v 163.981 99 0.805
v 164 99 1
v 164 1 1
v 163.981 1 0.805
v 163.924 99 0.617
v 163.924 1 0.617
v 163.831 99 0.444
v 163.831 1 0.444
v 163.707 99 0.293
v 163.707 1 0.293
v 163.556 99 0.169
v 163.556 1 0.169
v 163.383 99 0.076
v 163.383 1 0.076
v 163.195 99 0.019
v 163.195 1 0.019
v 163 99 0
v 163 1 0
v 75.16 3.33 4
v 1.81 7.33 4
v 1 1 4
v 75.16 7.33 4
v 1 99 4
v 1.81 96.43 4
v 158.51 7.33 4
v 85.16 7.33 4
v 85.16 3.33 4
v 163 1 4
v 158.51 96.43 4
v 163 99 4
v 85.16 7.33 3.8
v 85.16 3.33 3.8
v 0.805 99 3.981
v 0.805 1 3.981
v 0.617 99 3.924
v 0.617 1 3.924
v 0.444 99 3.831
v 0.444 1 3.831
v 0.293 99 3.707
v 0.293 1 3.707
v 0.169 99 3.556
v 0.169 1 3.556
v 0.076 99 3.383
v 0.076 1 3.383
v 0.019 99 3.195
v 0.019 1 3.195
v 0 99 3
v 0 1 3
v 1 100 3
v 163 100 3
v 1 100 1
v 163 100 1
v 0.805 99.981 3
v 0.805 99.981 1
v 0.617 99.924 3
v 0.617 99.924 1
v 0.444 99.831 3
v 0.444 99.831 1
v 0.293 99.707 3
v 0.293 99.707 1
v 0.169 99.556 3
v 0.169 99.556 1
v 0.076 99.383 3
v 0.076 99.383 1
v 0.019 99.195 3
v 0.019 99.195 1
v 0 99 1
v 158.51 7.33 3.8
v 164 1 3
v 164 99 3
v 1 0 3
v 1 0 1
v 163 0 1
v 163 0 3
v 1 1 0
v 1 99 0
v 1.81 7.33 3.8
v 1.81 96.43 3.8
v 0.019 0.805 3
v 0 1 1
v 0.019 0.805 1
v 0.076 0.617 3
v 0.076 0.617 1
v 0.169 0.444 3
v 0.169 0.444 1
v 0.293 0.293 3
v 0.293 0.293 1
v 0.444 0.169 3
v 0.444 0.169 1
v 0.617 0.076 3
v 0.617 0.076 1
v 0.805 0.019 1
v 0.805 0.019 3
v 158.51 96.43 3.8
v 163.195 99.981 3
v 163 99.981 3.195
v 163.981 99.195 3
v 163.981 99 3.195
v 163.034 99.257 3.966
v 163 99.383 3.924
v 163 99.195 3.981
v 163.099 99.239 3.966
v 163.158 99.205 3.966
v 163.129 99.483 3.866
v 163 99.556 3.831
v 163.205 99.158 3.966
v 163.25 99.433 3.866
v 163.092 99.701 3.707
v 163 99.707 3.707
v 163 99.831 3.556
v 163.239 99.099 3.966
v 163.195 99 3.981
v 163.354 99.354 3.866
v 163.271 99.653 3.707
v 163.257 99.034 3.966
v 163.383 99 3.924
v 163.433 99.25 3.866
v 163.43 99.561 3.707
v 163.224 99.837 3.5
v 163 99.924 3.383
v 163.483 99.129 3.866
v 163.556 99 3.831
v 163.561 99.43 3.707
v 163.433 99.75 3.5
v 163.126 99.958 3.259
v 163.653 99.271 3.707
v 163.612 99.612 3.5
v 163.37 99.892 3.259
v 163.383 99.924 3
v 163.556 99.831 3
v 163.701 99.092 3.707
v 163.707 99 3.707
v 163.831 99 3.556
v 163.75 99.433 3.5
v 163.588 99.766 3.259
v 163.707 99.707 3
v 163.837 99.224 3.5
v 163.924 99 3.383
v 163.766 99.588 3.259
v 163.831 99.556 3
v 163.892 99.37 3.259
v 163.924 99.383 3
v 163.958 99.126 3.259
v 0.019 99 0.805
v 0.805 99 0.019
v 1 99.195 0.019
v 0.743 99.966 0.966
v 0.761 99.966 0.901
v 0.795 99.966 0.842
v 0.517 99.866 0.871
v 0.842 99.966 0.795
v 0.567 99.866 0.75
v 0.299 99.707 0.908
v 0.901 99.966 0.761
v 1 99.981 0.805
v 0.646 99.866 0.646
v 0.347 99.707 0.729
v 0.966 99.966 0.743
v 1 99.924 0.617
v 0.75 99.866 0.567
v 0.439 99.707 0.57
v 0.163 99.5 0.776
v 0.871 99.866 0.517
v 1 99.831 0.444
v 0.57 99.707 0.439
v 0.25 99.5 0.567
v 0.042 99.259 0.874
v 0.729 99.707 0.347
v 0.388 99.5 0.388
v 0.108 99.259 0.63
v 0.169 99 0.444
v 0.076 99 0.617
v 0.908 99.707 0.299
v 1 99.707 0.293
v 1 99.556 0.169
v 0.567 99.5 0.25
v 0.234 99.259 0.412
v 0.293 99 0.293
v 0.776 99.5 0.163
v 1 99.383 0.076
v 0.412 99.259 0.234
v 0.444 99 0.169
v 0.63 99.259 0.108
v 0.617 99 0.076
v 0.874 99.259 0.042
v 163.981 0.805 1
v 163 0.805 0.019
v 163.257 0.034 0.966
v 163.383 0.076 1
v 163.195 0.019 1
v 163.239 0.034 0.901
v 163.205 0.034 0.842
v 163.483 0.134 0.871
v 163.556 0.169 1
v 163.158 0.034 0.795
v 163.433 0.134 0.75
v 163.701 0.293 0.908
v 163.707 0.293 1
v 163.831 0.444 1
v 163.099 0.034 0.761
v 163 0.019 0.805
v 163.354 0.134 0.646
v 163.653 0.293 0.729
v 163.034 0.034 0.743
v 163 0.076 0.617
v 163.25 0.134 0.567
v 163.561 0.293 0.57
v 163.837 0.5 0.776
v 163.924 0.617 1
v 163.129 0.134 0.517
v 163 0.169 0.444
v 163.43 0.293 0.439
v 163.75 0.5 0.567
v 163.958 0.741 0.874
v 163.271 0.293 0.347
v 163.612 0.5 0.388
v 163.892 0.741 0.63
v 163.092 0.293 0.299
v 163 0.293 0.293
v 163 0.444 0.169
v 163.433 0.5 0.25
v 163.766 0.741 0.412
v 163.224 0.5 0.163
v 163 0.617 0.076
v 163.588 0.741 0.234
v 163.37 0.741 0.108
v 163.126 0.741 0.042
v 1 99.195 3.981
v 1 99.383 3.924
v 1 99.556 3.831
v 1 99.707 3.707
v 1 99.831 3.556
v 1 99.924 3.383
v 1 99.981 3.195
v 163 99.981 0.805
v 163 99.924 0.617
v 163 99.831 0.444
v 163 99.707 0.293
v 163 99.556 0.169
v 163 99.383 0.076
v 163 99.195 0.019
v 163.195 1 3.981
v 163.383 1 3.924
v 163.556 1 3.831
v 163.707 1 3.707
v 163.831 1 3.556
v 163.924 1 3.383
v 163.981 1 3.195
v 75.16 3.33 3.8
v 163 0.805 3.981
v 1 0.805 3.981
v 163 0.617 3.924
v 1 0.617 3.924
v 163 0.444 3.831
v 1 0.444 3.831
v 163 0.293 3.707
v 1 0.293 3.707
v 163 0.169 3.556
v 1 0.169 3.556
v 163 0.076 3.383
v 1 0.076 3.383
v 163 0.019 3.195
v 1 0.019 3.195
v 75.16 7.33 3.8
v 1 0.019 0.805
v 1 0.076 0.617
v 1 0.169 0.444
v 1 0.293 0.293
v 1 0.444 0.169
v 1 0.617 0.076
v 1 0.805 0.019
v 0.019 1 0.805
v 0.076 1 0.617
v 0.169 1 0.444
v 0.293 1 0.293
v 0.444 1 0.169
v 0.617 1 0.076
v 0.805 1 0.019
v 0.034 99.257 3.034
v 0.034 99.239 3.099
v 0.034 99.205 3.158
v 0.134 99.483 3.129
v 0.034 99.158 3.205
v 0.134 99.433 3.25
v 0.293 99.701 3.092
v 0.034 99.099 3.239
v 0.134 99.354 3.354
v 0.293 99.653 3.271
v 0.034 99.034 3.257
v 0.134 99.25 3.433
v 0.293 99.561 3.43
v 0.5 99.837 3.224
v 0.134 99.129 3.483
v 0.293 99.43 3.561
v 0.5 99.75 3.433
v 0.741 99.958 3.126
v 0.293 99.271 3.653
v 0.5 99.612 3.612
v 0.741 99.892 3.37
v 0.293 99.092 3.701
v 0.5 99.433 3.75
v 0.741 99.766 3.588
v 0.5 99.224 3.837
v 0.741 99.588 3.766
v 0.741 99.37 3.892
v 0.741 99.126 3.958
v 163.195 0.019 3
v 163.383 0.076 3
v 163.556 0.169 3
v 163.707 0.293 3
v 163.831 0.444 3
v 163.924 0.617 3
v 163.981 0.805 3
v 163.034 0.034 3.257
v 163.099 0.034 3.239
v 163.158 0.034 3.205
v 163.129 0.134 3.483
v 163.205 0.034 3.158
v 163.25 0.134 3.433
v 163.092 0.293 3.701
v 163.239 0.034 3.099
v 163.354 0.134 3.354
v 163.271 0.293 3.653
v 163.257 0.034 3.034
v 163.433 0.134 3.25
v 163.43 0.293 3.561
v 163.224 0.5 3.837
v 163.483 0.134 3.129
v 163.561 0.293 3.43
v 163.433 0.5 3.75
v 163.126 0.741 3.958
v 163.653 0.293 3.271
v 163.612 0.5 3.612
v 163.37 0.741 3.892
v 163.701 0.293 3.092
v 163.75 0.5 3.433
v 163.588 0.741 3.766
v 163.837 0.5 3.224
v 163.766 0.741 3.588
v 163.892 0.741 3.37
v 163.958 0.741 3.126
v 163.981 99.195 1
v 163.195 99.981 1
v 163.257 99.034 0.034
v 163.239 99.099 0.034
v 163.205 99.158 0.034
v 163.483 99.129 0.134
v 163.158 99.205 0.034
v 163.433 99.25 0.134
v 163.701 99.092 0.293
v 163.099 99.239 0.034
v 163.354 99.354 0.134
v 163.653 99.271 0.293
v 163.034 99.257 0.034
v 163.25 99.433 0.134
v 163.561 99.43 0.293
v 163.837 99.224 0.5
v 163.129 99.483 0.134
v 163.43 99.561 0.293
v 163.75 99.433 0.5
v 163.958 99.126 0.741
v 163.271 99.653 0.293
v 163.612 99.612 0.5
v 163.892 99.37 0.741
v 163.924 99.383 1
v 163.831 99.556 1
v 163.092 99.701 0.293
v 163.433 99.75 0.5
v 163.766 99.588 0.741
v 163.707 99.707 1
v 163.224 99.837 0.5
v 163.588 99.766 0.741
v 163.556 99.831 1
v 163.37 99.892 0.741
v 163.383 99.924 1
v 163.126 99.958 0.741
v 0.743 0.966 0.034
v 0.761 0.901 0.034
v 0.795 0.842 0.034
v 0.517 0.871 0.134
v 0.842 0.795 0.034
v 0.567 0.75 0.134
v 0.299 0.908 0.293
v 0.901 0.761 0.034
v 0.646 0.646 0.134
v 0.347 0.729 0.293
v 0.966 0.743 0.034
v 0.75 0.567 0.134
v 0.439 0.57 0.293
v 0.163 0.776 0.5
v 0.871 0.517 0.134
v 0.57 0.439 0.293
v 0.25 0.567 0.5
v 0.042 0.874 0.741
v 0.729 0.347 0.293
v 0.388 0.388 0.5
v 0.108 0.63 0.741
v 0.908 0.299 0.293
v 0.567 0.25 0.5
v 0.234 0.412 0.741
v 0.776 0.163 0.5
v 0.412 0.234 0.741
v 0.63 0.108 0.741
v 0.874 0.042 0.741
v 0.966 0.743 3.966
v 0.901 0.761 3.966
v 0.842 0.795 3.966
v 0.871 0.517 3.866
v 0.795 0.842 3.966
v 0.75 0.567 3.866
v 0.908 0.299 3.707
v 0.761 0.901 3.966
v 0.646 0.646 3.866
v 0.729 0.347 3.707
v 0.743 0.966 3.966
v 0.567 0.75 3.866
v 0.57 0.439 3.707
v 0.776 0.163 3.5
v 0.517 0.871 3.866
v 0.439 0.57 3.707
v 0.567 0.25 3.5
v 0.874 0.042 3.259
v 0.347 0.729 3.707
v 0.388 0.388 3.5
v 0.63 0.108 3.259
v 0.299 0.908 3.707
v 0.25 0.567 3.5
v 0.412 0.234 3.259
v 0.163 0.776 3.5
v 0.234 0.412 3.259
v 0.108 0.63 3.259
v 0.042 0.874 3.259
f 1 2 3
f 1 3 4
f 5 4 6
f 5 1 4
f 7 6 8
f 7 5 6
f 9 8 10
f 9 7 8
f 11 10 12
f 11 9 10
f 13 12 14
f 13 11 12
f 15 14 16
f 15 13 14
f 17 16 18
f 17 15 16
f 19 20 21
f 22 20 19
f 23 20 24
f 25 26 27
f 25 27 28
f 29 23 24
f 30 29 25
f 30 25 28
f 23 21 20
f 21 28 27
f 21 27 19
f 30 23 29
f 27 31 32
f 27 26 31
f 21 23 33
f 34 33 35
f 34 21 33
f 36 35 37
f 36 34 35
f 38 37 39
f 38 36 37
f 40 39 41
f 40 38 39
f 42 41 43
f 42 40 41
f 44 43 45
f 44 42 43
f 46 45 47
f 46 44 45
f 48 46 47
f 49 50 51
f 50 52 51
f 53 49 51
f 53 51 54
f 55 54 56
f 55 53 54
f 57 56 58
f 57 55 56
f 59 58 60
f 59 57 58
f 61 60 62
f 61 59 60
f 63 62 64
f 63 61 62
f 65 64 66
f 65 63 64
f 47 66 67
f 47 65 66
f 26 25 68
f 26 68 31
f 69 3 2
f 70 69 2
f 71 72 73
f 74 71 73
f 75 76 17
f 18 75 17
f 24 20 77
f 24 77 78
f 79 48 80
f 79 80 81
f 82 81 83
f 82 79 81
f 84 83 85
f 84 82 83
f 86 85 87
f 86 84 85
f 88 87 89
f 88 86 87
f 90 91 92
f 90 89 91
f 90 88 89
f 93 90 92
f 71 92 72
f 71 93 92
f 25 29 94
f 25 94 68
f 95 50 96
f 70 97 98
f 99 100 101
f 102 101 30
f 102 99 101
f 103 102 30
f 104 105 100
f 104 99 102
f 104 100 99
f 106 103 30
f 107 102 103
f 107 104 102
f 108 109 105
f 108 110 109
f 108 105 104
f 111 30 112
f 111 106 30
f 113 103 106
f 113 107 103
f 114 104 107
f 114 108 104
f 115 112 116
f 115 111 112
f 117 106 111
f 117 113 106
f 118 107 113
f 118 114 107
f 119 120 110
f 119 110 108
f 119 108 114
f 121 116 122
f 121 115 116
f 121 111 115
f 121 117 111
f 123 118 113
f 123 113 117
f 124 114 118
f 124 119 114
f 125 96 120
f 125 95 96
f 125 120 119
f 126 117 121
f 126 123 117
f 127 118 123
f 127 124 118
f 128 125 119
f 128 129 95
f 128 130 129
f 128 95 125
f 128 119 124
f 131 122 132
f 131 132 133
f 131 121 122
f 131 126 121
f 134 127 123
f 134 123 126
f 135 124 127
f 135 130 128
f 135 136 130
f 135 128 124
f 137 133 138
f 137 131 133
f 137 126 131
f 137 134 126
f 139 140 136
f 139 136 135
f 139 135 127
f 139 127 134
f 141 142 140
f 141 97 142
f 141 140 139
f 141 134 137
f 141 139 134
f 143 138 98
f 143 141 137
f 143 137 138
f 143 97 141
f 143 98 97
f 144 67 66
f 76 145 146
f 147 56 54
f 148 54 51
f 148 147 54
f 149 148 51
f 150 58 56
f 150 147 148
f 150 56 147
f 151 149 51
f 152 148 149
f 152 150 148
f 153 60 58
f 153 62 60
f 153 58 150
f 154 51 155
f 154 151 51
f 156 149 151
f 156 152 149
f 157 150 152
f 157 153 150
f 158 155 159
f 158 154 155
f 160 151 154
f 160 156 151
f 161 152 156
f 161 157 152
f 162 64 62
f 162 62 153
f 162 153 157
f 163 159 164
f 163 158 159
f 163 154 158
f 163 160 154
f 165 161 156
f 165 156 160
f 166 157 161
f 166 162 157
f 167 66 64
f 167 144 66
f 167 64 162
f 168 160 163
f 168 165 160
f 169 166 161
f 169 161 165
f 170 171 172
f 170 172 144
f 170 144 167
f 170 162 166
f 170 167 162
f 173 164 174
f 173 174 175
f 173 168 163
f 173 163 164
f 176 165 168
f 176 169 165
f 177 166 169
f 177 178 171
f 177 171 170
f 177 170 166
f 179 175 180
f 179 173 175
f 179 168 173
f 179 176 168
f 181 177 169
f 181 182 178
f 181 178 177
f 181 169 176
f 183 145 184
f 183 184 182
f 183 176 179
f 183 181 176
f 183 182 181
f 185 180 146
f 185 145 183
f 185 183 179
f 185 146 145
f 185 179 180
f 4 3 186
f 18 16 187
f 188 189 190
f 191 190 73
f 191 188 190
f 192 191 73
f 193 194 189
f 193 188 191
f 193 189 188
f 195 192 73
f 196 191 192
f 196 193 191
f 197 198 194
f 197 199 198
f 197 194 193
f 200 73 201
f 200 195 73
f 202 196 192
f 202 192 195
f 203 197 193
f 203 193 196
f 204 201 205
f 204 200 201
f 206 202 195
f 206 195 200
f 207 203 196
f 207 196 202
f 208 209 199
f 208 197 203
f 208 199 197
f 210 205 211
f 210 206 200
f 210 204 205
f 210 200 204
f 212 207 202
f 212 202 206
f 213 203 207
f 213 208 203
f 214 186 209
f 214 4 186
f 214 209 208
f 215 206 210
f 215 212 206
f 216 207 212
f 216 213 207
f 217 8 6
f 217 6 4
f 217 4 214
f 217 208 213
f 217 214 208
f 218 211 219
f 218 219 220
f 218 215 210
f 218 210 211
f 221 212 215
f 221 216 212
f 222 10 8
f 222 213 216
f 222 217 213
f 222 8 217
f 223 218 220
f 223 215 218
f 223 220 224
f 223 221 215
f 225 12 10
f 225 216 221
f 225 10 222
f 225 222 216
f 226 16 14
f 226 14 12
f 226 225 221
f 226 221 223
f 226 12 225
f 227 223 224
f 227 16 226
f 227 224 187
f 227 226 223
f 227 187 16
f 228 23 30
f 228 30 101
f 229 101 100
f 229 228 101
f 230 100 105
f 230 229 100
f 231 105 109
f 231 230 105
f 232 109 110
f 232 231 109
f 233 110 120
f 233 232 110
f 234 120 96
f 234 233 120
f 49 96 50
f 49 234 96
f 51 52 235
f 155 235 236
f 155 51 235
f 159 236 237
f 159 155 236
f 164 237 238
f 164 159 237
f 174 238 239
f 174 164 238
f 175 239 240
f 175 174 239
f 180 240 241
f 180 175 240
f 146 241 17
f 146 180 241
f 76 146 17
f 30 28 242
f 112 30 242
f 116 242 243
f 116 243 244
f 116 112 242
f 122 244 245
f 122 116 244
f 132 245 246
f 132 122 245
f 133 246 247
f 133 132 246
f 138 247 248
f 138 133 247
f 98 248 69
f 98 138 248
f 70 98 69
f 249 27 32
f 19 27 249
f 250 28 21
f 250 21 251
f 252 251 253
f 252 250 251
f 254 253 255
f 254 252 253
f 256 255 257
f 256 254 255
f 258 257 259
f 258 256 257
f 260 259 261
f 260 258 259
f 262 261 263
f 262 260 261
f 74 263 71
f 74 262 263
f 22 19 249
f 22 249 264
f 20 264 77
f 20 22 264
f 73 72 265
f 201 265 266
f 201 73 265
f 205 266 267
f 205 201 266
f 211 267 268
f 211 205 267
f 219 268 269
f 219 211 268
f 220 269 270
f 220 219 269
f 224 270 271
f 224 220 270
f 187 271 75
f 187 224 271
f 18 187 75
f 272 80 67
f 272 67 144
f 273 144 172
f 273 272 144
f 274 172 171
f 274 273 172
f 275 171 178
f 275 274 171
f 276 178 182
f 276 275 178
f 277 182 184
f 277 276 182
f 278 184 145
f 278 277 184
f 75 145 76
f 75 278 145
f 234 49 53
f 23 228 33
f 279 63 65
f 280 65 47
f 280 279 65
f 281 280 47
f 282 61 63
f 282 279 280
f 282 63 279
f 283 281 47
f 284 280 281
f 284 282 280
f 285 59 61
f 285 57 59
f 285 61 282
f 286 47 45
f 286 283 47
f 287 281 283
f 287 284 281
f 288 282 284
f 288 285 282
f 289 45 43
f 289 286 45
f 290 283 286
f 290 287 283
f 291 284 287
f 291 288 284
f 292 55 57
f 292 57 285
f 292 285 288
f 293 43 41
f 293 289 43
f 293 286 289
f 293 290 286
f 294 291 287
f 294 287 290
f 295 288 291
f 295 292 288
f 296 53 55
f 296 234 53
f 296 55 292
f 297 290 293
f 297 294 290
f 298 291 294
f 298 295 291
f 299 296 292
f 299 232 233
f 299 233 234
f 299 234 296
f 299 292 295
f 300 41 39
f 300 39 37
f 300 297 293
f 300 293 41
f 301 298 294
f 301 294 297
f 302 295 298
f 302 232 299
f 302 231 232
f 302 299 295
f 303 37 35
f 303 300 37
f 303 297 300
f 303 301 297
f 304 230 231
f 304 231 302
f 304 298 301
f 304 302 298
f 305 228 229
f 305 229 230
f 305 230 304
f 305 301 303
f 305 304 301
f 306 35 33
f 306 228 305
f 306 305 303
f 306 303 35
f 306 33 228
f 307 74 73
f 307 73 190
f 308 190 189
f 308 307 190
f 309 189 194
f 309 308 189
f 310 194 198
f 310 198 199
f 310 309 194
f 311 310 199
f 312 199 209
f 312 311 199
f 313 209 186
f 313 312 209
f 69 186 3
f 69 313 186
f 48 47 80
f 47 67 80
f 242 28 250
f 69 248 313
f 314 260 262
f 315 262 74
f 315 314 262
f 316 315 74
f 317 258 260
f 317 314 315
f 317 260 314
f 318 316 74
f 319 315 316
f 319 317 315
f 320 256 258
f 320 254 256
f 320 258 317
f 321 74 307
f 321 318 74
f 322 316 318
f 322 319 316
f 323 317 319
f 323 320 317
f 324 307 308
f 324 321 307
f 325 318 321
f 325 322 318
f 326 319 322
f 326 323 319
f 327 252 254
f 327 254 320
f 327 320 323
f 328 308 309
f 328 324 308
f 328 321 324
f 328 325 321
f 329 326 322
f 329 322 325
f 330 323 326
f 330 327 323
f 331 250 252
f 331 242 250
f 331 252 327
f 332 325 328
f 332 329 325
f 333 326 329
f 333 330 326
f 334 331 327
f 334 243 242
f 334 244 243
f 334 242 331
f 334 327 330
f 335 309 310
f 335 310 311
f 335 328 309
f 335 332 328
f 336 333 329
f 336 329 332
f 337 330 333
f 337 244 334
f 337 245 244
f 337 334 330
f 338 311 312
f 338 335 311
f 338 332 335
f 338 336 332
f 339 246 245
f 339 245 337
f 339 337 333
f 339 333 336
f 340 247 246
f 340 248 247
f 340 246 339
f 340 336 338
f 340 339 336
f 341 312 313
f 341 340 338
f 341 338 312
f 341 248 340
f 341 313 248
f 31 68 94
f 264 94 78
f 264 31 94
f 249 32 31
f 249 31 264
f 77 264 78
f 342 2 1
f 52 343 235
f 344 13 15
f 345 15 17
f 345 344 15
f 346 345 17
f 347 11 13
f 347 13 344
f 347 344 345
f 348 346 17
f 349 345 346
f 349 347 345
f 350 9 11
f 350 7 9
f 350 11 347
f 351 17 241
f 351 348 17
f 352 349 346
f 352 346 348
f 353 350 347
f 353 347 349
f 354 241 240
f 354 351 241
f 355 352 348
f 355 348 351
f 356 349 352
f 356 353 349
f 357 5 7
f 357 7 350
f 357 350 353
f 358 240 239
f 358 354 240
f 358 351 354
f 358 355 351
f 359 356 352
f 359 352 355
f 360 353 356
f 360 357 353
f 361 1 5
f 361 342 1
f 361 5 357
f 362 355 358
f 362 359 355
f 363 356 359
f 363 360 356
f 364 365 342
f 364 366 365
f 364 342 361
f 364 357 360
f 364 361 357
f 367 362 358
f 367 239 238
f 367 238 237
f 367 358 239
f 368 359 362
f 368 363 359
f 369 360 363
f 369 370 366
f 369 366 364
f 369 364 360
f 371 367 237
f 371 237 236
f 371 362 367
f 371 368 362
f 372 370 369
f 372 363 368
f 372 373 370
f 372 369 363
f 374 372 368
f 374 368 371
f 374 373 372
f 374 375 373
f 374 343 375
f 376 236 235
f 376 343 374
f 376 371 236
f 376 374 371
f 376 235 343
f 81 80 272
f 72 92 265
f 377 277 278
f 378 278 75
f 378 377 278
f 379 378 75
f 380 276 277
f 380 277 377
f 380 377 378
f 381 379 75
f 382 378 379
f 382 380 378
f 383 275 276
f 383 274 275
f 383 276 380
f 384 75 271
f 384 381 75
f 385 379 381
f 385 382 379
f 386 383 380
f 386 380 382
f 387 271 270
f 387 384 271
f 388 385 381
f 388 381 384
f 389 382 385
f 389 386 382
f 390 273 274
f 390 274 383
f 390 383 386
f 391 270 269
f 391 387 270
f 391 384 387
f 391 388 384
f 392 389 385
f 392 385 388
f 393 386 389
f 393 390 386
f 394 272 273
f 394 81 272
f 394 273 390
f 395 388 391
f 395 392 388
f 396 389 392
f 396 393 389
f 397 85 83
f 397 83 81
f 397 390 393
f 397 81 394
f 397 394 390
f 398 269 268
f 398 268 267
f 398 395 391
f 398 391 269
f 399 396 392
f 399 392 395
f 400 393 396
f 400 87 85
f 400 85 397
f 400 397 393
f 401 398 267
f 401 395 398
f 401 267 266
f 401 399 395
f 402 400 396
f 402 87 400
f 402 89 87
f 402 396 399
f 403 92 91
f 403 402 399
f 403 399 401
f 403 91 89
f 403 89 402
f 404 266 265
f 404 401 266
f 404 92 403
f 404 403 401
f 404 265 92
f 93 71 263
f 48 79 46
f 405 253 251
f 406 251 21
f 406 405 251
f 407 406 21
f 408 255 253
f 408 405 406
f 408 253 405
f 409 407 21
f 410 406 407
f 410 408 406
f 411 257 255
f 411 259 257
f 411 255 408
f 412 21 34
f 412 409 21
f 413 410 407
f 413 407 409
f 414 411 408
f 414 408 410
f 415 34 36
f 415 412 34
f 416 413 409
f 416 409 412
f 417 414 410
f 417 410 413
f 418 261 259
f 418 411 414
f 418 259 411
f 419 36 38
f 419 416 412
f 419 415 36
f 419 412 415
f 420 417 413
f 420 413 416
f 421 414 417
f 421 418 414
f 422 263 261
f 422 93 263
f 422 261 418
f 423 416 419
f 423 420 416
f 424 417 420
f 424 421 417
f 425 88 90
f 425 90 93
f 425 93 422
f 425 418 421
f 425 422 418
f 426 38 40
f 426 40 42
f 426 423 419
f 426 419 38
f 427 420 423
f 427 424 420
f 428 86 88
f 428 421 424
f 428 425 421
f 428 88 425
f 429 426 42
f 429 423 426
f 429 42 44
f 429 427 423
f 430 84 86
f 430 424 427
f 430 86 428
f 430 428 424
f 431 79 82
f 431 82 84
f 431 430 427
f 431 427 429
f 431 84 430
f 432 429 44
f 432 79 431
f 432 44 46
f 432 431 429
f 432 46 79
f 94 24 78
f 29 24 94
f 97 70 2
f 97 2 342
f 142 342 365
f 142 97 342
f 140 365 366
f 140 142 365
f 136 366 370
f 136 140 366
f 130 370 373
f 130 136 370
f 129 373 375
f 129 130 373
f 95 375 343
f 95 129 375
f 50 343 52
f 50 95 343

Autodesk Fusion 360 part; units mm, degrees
sketch "Sketch1" plane through (0, 0, 0) normal (0, 0, 1) x (1, 0, 0) in component "Display"
  line L0 (0, 0) -> (164, 0)
  line L1 (164, 0) -> (164, 100)
  line L2 (164, 100) -> (0, 100)
  line L3 (0, 100) -> (0, 0)
  dimension "d1" = 164
  dimension "d2" = 100
extrude "Extrude1" add sketch "Sketch1" along normal blind 4 in component "Display"
fillet "Fillet1" radius 1 12 edges at (164, 100, 2) (164, 50, 0) (82, 100, 4) (0, 0, 2) (164, 50, 4) (0, 50, 4) (82, 0, 4) (82, 0, 0) (0, 50, 0) (164, 0, 2) (82, 100, 0) (0, 100, 2) in component "Display"
sketch "Sketch2" plane through (0, 0, 4) normal (0, 0, 1) x (-1, 0, 0) in component "Display"
  line L0 (-163, -99) -> (-1, -99)
  line L1 (-1, -99) -> (-1, -1)
  line L2 (-1, -1) -> (-163, -1)
  line L3 (-163, -1) -> (-163, -99)
  line L4 (-1.81, -96.43) -> (-158.51, -96.43)
  line L5 (-158.51, -96.43) -> (-158.51, -7.33)
  line L6 (-158.51, -7.33) -> (-1.81, -7.33)
  line L7 (-1.81, -7.33) -> (-1.81, -96.43)
  line L8 (-164, -100) -> (0, -100)
  line L9 (-164, 0) -> (-164, -100)
  line L10 (-75.16, -7.33) -> (-85.16, -7.33)
  line L11 (-85.16, -7.33) -> (-85.16, -3.33)
  line L12 (-85.16, -3.33) -> (-75.16, -3.33)
  line L13 (-75.16, -3.33) -> (-75.16, -7.33)
  line L14 (-80.16, -3.33) -> (-80.16, -7.33) construction
  dimension "d7" = 3.57
  dimension "d8" = 5.49
  dimension "d9" = 156.7
  dimension "d10" = 89.1
  dimension "d13" = 10
  dimension "d14" = 4
extrude "Extrude2" cut sketch "Sketch2" against normal blind 0.2 contours L4 L5 L6 L7 L10 | L6 L10 L11 L12 L13 in component "Display"
component "Display" placed x (1, 0, 0) y (0, 1, 0) z (0, 0, 1) at (0, 0, 0)
